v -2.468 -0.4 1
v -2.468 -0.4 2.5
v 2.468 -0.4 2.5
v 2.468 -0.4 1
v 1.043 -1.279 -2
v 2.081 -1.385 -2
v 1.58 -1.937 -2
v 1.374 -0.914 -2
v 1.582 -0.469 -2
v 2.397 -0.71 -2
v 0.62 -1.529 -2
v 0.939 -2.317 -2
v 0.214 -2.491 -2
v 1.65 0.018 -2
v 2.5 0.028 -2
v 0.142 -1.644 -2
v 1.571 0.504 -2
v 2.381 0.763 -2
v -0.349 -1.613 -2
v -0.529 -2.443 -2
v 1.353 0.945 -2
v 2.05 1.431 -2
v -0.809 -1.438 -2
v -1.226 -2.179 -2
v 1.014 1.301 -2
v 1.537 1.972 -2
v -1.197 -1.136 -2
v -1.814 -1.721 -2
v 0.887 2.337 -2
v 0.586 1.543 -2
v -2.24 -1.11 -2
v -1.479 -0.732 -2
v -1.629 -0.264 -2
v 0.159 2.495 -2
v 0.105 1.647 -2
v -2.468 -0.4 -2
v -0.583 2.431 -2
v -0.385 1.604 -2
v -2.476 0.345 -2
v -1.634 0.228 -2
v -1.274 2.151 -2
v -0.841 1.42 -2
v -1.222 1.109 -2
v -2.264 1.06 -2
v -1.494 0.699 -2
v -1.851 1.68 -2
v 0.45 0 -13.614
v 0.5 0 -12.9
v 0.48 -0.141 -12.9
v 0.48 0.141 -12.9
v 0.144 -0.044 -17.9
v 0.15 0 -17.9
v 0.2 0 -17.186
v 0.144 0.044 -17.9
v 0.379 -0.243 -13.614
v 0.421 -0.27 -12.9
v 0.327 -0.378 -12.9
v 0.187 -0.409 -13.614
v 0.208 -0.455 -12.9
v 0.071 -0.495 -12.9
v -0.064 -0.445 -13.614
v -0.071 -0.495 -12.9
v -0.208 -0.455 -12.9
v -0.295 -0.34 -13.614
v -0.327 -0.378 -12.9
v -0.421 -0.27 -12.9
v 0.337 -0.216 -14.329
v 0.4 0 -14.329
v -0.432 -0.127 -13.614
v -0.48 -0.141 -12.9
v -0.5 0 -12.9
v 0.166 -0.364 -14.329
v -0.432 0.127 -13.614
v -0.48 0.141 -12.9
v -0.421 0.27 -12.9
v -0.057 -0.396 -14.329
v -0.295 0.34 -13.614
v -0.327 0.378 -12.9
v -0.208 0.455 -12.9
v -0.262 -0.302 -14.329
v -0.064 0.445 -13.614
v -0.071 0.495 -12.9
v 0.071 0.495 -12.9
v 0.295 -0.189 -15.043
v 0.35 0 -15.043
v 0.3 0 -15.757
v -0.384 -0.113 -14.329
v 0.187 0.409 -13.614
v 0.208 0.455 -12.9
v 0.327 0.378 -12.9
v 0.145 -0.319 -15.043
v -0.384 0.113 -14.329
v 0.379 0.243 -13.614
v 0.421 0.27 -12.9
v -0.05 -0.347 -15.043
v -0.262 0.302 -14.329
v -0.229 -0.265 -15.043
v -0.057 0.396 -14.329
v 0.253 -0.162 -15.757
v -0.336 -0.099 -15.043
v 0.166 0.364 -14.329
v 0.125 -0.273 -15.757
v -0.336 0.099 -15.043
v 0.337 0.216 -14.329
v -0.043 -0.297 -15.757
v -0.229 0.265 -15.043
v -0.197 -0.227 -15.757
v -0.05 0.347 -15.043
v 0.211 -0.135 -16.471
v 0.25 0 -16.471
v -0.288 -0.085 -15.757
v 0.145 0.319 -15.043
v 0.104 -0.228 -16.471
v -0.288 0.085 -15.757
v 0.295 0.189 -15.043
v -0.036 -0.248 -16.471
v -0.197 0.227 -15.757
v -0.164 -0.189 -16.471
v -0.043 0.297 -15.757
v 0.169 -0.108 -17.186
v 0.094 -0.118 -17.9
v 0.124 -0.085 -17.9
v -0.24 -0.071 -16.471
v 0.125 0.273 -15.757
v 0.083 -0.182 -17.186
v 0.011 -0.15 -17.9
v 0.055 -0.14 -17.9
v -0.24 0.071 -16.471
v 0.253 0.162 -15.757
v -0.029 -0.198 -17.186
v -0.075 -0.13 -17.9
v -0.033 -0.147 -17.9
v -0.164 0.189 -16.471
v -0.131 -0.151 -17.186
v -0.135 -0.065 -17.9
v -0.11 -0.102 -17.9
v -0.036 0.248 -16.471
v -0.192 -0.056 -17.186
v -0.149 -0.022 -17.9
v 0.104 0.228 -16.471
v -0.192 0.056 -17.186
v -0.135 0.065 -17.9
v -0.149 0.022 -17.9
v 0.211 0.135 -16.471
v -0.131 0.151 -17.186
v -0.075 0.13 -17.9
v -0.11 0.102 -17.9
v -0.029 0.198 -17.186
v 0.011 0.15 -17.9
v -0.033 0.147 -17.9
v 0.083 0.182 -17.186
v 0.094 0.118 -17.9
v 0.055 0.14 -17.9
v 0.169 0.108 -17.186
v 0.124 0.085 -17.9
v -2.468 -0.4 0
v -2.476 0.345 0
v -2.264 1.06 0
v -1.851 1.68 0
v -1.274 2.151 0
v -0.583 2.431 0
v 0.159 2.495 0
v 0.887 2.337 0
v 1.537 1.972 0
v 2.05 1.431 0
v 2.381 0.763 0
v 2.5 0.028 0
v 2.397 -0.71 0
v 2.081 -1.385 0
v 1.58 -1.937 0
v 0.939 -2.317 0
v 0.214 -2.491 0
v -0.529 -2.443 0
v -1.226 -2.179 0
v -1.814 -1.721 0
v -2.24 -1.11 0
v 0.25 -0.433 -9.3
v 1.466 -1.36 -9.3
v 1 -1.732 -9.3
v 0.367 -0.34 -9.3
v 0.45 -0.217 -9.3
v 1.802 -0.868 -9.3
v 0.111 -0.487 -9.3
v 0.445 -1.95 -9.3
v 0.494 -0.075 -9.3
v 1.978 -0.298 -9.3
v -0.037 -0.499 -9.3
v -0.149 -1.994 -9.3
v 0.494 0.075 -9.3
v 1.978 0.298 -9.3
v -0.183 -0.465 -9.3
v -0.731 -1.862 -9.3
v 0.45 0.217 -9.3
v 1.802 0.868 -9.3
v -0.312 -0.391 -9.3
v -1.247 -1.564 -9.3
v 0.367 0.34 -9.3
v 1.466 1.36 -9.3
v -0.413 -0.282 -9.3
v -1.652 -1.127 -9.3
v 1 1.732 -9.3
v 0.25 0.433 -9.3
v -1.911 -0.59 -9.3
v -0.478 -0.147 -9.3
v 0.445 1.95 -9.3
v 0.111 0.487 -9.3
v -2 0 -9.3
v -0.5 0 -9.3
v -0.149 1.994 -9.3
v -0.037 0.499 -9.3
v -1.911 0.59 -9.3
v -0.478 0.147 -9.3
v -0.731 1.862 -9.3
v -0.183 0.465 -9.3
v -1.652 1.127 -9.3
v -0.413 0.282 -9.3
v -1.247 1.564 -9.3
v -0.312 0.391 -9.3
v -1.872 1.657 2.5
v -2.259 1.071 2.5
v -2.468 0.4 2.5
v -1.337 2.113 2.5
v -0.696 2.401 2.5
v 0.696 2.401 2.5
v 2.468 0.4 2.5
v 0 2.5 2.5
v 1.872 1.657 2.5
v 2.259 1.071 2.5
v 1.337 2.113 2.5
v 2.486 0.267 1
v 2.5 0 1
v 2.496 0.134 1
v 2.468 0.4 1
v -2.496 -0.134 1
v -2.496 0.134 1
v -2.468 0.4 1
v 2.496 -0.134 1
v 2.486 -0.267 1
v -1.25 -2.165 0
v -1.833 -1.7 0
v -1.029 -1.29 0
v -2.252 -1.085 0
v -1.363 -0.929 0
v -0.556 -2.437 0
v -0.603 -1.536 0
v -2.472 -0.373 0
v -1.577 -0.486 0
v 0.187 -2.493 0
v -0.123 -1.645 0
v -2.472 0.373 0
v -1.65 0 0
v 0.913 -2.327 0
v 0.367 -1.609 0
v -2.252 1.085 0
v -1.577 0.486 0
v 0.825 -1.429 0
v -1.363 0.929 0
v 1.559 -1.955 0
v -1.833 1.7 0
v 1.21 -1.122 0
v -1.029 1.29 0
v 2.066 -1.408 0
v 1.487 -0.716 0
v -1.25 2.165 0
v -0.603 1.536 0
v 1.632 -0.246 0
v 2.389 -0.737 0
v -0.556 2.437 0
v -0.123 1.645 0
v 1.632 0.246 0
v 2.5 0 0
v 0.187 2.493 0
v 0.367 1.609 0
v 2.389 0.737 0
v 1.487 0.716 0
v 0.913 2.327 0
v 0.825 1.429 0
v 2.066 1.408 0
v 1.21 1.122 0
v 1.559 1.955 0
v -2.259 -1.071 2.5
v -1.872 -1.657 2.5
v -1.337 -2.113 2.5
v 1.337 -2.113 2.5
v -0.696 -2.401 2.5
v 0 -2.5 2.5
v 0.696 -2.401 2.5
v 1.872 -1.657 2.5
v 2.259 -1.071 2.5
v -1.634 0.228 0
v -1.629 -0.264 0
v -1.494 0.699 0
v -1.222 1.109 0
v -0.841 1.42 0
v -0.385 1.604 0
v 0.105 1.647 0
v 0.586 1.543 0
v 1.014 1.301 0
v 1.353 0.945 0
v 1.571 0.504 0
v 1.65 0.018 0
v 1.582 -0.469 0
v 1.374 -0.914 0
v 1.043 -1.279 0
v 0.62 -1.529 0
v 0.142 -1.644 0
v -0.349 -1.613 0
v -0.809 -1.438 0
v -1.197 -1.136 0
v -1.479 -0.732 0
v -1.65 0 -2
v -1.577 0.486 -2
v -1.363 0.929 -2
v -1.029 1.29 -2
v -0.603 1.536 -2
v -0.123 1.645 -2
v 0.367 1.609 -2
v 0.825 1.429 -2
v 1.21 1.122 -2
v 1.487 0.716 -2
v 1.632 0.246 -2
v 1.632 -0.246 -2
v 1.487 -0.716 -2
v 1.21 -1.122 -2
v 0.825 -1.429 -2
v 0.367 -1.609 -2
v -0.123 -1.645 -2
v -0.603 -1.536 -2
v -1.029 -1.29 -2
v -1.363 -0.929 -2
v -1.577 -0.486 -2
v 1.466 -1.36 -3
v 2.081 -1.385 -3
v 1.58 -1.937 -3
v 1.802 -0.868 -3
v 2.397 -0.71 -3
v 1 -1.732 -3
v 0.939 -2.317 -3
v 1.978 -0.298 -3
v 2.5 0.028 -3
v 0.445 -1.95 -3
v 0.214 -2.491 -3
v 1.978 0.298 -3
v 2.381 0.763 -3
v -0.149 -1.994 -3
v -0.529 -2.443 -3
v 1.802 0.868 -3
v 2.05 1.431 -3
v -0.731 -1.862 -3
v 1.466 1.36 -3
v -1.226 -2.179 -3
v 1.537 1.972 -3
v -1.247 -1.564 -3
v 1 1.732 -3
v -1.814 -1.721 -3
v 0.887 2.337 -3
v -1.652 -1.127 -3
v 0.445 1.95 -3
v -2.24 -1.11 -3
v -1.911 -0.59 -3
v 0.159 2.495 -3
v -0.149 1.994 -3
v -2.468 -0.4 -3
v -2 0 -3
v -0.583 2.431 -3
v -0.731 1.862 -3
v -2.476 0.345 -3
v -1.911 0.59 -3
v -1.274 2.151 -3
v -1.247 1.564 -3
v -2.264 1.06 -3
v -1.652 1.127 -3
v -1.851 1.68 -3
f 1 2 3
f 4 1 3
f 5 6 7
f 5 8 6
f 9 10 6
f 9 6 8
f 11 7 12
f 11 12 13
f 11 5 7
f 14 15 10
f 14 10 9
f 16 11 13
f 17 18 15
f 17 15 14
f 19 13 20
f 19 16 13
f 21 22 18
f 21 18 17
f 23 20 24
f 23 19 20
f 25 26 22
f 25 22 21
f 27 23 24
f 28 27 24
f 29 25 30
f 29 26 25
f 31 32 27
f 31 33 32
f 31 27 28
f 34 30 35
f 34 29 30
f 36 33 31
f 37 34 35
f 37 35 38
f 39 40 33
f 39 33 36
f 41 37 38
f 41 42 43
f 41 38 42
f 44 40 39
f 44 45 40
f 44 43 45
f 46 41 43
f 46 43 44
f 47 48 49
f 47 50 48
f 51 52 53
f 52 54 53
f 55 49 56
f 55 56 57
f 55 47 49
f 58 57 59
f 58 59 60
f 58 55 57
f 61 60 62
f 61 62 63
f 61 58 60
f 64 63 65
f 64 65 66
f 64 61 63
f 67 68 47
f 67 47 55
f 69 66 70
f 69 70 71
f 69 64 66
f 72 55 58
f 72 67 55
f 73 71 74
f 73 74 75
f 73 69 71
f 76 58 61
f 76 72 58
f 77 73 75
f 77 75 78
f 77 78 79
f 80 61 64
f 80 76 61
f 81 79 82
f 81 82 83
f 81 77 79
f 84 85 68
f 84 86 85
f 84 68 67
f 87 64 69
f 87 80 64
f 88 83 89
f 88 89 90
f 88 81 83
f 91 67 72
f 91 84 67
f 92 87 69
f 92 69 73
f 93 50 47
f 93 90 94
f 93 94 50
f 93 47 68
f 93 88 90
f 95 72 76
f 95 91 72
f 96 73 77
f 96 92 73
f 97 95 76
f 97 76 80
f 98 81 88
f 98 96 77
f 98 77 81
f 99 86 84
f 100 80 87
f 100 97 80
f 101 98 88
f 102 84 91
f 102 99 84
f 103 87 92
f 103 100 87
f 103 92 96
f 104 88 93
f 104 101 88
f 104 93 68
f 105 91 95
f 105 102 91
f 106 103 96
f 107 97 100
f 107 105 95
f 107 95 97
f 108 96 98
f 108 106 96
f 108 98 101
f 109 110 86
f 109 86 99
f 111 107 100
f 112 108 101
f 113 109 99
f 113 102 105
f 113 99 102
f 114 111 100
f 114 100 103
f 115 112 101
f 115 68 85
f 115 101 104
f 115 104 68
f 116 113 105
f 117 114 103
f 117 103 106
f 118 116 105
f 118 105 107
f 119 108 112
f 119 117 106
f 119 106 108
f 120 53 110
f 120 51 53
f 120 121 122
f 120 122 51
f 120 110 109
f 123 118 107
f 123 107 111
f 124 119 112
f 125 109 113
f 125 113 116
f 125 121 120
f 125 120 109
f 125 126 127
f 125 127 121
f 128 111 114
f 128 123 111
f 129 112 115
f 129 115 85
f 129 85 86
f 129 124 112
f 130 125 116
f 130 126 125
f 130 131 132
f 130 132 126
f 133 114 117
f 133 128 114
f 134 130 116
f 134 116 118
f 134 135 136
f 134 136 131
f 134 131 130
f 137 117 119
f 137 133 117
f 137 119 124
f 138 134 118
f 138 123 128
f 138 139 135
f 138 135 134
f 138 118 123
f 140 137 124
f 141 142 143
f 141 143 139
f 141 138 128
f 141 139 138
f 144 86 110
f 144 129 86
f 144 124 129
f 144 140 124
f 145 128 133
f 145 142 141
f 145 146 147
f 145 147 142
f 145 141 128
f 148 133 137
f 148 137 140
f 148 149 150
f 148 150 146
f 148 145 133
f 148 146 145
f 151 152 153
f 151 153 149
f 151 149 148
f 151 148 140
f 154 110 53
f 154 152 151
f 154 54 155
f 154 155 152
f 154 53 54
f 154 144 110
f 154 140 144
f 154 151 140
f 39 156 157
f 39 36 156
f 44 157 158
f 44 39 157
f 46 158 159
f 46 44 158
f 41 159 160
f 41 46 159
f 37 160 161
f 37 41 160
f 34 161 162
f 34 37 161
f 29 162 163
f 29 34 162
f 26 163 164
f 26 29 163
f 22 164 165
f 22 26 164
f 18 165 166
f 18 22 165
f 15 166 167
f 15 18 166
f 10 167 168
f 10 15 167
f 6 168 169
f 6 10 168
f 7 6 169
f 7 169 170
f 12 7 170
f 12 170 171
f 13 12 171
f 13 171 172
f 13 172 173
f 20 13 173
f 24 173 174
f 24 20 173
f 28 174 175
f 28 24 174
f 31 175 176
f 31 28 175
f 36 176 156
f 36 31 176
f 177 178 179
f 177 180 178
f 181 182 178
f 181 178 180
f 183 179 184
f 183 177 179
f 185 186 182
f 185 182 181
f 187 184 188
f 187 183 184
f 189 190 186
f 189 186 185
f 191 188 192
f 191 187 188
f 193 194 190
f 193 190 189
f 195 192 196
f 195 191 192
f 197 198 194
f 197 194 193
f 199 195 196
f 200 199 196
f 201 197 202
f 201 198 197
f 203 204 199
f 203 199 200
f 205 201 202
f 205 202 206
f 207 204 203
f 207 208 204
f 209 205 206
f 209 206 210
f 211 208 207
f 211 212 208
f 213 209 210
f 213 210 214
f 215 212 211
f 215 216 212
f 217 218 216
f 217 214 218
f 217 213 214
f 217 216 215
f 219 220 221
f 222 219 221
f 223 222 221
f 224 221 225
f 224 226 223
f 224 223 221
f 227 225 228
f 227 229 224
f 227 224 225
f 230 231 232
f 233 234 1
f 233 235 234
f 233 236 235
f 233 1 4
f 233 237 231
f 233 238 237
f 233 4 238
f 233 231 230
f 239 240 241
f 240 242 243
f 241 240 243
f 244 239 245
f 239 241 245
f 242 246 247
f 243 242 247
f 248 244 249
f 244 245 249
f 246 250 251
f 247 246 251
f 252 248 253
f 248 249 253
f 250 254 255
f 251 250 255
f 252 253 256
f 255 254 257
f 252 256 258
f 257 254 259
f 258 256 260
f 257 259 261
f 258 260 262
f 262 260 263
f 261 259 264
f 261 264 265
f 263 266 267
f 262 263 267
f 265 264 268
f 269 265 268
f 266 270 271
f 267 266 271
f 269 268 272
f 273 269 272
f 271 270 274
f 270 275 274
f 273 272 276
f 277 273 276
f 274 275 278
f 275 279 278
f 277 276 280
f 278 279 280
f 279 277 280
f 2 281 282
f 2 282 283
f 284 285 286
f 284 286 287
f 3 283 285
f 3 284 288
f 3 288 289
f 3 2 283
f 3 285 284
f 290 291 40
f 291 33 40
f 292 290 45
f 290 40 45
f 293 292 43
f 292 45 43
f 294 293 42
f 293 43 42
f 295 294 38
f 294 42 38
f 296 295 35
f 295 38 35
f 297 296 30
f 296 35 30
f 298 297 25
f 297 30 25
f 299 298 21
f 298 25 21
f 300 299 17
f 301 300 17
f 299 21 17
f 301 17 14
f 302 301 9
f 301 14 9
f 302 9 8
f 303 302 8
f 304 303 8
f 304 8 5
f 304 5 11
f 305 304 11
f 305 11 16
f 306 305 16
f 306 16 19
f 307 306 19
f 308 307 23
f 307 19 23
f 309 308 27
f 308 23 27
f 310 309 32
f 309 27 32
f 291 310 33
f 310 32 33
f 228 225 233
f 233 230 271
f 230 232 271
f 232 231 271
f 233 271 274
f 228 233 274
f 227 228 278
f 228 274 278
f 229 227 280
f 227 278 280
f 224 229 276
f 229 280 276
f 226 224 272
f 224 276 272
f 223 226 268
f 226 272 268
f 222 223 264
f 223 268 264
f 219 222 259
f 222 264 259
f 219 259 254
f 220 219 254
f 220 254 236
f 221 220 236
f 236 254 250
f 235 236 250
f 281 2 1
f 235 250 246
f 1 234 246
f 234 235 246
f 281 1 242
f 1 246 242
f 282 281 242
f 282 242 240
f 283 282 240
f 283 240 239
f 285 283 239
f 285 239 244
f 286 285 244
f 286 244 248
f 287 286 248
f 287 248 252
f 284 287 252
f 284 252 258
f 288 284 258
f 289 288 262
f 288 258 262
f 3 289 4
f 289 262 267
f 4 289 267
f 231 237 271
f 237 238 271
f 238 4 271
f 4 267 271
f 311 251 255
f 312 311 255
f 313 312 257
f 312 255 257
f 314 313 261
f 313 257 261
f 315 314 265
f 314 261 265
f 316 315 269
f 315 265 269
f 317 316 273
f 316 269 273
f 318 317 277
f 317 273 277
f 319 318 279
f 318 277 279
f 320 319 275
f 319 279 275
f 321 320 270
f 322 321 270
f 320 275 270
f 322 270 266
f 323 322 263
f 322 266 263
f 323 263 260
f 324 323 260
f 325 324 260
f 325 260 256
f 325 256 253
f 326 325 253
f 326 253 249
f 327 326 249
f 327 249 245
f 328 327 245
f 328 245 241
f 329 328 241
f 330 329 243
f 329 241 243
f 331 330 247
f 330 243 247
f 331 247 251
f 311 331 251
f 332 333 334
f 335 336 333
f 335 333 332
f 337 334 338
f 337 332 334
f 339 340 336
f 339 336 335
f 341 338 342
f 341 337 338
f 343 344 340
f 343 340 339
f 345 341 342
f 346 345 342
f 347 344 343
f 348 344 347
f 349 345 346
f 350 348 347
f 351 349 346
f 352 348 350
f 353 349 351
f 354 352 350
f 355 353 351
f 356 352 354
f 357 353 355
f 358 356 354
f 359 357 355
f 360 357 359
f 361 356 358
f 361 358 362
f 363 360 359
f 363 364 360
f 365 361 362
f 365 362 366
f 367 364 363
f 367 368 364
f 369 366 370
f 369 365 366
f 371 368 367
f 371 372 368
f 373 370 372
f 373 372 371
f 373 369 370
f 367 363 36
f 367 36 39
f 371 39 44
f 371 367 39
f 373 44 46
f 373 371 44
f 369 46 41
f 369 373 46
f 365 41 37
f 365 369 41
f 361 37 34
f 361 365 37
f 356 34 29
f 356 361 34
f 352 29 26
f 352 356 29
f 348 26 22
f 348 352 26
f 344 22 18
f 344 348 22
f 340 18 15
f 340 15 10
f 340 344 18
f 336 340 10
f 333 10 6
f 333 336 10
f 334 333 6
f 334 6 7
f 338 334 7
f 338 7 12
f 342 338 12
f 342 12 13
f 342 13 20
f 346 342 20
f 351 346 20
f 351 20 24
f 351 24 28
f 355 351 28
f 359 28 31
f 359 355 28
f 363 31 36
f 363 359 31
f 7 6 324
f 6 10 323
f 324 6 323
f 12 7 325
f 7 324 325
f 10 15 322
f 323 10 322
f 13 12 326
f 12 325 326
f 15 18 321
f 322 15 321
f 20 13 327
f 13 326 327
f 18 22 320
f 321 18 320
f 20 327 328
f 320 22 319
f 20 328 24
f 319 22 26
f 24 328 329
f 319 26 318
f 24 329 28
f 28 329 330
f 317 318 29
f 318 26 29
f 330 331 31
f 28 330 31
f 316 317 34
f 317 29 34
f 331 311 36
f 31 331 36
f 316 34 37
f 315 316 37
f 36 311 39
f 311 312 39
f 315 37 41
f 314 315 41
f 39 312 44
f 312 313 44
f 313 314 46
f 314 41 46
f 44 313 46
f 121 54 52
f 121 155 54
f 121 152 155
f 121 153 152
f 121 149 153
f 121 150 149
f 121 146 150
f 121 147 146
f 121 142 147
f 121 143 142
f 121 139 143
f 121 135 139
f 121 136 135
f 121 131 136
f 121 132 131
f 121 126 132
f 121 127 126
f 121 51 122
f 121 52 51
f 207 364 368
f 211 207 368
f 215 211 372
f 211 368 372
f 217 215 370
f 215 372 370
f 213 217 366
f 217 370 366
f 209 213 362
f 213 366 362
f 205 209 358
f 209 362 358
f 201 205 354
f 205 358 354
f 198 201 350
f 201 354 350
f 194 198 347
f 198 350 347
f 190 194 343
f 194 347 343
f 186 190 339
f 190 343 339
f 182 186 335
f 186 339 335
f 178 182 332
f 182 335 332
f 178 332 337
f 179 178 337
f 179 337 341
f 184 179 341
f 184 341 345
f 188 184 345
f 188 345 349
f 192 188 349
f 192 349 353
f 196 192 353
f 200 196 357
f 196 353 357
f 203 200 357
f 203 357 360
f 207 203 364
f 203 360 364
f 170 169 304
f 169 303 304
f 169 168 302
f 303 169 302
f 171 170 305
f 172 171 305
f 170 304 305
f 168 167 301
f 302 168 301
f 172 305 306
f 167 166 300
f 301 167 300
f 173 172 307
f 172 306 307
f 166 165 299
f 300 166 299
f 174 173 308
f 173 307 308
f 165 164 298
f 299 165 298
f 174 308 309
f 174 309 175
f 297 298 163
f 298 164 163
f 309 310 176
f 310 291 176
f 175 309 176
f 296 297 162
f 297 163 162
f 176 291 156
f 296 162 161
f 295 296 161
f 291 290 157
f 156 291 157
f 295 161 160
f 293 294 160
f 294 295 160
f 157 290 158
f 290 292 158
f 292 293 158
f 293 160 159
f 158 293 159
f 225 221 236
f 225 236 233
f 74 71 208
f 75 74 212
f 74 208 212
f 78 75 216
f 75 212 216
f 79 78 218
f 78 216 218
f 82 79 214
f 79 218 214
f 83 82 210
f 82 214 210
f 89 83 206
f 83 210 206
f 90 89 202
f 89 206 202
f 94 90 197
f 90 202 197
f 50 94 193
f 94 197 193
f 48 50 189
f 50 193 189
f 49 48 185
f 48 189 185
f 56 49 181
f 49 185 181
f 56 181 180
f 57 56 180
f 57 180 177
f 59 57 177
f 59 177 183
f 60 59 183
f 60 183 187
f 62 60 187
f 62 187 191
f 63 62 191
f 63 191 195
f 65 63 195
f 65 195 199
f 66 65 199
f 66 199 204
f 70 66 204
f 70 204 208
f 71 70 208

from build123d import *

# Parameters (mm, degrees)
SKETCH1_R           = 2.5
BOSS_EXTRUDE1_DEPTH = 2.5
SKETCH2_W           = 11.4011802
SKETCH2_H           = 0.8
CUT_EXTRUDE1_DEPTH  = 1.5
SKETCH3_R           = 1.65
BOSS_EXTRUDE2_DEPTH = 2
BOSS_EXTRUDE3_START = 1
SKETCH4_R           = 2.5
BOSS_EXTRUDE3_DEPTH = 1
SKETCH5_W           = 0.85
SKETCH5_H           = 2
SKETCH6_R           = 2
BOSS_EXTRUDE4_DEPTH = 6.3
SKETCH7_R           = 0.5
BOSS_EXTRUDE5_DEPTH = 3.6
SKETCH8_R           = 0.5
BOSS_EXTRUDE6_DEPTH = 5
BOSS_EXTRUDE6_TAPER = 4


with BuildPart() as part:
    # Sketch1 → Boss-Extrude1 (new body)
    with BuildSketch(Plane.XY):
        Circle(SKETCH1_R)
    extrude(amount=BOSS_EXTRUDE1_DEPTH)

    # Sketch2 → Cut-Extrude1 (cut)
    with BuildSketch(Plane.XY.offset(2.5)):
        Rectangle(SKETCH2_W, SKETCH2_H)
    extrude(amount=-CUT_EXTRUDE1_DEPTH, mode=Mode.SUBTRACT)

    # Sketch3 → Boss-Extrude2 (add)
    with BuildSketch(Plane(origin=(0, 0, 0), x_dir=(-1, 0, 0), z_dir=(0, 0, -1))):
        Circle(SKETCH3_R)
    extrude(amount=BOSS_EXTRUDE2_DEPTH)

    # Sketch4 → Boss-Extrude3 (add)
    with BuildSketch(Plane(origin=(0, 0, -2), x_dir=(-1, 0, 0), z_dir=(0, 0, -1)).offset(BOSS_EXTRUDE3_START)):
        with Locations(Location((0, 0, 0), (0, 0, 350.793103779))):
            Circle(SKETCH4_R)
    extrude(amount=-BOSS_EXTRUDE3_DEPTH)

    # Sketch6 → Boss-Extrude4 (add)
    with BuildSketch(Plane(origin=(0, 0, -3), x_dir=(-1, 0, 0), z_dir=(0, 0, -1))):
        Circle(SKETCH6_R)
    extrude(amount=BOSS_EXTRUDE4_DEPTH)

    # Sketch7 → Boss-Extrude5 (add)
    with BuildSketch(Plane(origin=(0, 0, -9.3), x_dir=(-1, 0, 0), z_dir=(0, 0, -1))):
        Circle(SKETCH7_R)
    extrude(amount=BOSS_EXTRUDE5_DEPTH)

    # Sketch8 → Boss-Extrude6 (add)
    with BuildSketch(Plane(origin=(0, 0, -12.9), x_dir=(-1, 0, 0), z_dir=(0, 0, -1))):
        with Locations(Location((0, 0, 0), (0, 0, 180))):
            Circle(SKETCH8_R)
    extrude(amount=BOSS_EXTRUDE6_DEPTH, taper=BOSS_EXTRUDE6_TAPER)


with BuildPart() as body_2:
    # Sketch5 → Revolve1 (revolve)
    with BuildSketch(Plane(origin=(0, 0, 0), x_dir=(-1, 0, 0), z_dir=(0, -1, 0)), mode=Mode.PRIVATE) as revolve1_sk:
        with Locations((-2.075, 1)):
            Rectangle(SKETCH5_W, SKETCH5_H)
    revolve(revolve1_sk.sketch.rotate(Axis((0, 0, 4.043631363), (0, 0, -1)), 170.793103779), axis=Axis((0, 0, 4.043631363), (0, 0, -1)))


solid = Compound([part.part, body_2.part])
